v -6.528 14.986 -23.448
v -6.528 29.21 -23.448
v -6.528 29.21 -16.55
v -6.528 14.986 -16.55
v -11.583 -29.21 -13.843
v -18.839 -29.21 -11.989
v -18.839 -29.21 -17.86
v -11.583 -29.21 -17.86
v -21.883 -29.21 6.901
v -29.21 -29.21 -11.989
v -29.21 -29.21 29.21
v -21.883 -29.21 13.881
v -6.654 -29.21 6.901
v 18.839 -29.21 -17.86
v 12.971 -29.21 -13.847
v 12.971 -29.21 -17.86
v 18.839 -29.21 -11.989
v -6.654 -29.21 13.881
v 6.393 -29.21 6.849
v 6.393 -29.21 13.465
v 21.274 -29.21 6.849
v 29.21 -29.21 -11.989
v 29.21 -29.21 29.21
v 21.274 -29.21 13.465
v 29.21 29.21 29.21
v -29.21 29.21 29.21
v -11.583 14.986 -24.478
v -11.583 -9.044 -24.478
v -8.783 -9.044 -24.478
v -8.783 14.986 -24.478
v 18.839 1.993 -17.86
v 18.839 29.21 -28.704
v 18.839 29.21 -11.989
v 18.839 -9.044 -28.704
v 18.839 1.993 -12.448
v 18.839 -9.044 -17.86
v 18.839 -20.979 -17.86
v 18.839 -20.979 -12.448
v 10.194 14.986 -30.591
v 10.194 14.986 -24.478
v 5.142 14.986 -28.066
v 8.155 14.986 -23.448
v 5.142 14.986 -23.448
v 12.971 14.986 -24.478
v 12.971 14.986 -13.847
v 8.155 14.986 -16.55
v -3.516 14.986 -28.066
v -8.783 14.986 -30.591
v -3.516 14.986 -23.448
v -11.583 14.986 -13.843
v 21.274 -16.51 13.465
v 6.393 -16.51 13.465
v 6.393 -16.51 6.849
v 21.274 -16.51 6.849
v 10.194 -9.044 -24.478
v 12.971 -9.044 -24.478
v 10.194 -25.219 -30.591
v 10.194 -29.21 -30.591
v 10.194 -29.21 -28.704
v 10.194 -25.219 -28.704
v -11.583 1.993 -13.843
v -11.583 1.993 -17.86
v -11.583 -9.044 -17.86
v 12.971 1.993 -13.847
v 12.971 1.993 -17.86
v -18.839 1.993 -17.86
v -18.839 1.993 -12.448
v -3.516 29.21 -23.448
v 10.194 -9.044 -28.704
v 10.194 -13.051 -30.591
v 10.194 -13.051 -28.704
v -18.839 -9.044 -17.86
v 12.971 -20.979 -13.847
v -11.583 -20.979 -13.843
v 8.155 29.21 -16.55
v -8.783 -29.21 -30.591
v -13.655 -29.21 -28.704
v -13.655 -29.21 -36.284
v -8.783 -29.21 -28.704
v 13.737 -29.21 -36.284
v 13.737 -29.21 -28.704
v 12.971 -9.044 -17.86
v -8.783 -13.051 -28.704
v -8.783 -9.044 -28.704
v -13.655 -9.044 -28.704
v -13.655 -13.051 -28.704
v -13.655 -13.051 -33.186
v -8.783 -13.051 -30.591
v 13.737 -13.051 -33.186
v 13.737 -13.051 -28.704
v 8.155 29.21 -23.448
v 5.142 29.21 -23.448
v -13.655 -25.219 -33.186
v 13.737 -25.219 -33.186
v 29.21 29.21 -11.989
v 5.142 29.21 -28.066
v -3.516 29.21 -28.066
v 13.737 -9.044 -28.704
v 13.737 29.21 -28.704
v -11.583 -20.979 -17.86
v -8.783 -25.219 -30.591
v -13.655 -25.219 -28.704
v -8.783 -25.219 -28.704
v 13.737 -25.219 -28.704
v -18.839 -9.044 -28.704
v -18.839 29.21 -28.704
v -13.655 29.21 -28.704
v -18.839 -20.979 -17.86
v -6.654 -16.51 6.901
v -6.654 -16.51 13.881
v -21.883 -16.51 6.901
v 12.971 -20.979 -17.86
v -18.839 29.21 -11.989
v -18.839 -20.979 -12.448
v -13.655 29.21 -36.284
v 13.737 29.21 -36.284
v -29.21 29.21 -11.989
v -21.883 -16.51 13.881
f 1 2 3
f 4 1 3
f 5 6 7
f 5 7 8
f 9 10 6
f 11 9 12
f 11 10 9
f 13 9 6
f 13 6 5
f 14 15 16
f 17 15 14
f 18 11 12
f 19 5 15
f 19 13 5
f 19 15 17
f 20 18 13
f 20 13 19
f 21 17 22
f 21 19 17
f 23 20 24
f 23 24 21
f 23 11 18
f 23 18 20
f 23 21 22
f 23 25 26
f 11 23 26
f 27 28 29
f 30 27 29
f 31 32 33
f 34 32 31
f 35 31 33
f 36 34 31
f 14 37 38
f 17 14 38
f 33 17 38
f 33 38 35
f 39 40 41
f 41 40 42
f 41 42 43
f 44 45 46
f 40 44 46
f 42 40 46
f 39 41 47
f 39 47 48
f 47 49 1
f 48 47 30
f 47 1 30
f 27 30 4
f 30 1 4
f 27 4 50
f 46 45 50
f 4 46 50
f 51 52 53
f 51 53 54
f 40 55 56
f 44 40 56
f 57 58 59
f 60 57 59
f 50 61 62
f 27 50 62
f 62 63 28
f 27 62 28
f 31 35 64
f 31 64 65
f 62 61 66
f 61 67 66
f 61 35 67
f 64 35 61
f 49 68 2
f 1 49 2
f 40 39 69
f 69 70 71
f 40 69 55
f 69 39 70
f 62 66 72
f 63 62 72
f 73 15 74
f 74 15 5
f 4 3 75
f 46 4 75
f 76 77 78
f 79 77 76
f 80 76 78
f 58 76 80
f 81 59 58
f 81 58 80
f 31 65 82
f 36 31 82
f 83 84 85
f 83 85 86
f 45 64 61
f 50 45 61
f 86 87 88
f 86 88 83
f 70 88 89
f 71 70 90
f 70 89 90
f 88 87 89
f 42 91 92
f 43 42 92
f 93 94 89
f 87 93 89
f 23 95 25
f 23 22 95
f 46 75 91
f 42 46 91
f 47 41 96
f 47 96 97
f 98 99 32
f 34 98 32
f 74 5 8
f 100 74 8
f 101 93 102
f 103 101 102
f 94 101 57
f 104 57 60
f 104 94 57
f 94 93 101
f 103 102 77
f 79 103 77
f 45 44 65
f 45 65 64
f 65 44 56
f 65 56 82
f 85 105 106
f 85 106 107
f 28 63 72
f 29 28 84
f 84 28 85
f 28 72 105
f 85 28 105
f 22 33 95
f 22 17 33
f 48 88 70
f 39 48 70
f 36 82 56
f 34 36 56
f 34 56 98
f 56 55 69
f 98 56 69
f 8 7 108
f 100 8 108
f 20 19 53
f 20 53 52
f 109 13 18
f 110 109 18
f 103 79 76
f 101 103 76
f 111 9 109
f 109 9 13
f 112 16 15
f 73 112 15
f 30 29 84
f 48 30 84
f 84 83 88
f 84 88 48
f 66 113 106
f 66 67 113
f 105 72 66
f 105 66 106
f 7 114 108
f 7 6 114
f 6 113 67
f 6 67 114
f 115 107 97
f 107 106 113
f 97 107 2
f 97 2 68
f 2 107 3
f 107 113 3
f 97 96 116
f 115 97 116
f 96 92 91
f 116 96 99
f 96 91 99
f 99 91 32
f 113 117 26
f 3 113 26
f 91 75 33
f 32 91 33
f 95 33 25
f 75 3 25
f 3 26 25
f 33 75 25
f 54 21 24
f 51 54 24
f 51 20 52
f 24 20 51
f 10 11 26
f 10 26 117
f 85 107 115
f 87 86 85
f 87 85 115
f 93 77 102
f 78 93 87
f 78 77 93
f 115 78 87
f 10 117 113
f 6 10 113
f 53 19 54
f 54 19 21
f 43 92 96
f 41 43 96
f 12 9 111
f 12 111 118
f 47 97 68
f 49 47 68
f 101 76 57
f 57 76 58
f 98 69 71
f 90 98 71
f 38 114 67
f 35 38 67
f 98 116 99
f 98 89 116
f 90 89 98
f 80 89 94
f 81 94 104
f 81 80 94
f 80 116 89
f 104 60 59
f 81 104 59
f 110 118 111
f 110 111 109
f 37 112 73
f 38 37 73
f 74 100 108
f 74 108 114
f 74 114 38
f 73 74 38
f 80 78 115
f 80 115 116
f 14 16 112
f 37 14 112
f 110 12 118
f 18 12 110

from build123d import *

# Parameters (mm, degrees)
F1_DEPTH  = 29.21
F2_W      = 15.2287210607
F2_H      = 6.9798285036
F2_W_2    = 14.8809022204
F2_H_2    = 6.6161153238
F3_DEPTH  = 12.7
F5_DEPTH  = 58.42
F7_DEPTH  = 37.677641958
F8_W      = 12.1679750076
F8_H      = 4.4820662588
F9_DEPTH  = 27.3915433795
F11_DEPTH = 14.224
F13_DEPTH = 14.224


# Not quite as in the source:
# - a feature names something its author has since deleted; it is built from what else it names


with BuildPart() as f1:
    # F0 (on Front) → F1 (new body, symmetric)
    with BuildSketch(Plane.XZ):
        Polygon((29.21, 29.21), (-29.21, 29.21), (-29.21, -11.9885886088), (-18.838820979, -11.9885886088), (-18.838820979, -28.7043564022), (-13.6548336595, -28.7043564022), (-13.6548336595, -36.2838581204), (13.73670972, -36.2838581204), (13.73670972, -28.7043564022), (18.838820979, -28.7043564022), (18.838820979, -11.9885886088), (29.21, -11.9885886088), align=None)
    extrude(amount=F1_DEPTH, both=True)

    # F2 (on face) → F3 (cut)
    with BuildSketch(Plane.XZ.offset(29.21)):
        with Locations((-14.2686051116, 10.3913402672)):
            Rectangle(F2_W, F2_H)
        with Locations((13.8336278745, 10.1568780676)):
            Rectangle(F2_W_2, F2_H_2)
    extrude(amount=-F3_DEPTH, mode=Mode.SUBTRACT)

    # F4 (on face) → F5 (cut, through all)
    with BuildSketch(Plane.XZ.offset(29.21)):
        Polygon((-11.5834288299, -13.842545168), (-11.5834288299, -24.4784541428), (-8.7825786322, -24.4784541428), (-8.7825786322, -30.5909998715), (10.1944149937, -30.5909998715), (10.1944149937, -24.4784541428), (12.9711292684, -24.4784541428), (12.9711292684, -13.8473447557), align=None)
    extrude(amount=-F5_DEPTH, mode=Mode.SUBTRACT)

    # F6 (on face) → F7 (cut, through all)
    with BuildSketch(Plane(origin=(-18.838820979, 0, 0), x_dir=(0, -1, 0), z_dir=(-1, 0, 0))):
        Polygon((20.9785699844, -12.4480193481), (-1.9933339208, -12.4480193481), (-1.9933339208, -17.8599096835), (9.0442672372, -17.8599096835), (9.0442672372, -28.7043564022), (29.3133463711, -28.7043564022), (29.3133463711, -17.8599096835), (20.9785699844, -17.8599096835), align=None)
    extrude(amount=-F7_DEPTH, mode=Mode.SUBTRACT)

    # F8 (on face) → F9 (cut, through all)
    with BuildSketch(Plane.YZ.offset(13.73670972)):
        with Locations((-19.1350400816, -30.9453895316)):
            Rectangle(F8_W, F8_H)
    extrude(amount=-F9_DEPTH, mode=Mode.SUBTRACT)

    # F10 (on face) → F11 (join)
    with BuildSketch(Plane(origin=(0, 29.21, 0), x_dir=(-1, 0, 0), z_dir=(0, 1, 0))):
        Polygon((12.8193823621, -11.6105714807), (-15.3379710391, -11.6105714807), (-15.3379710391, -26.3032335788), (-12.9711292684, -26.3032335788), (-12.9795083776, -31.884662807), (10.1667114277, -31.884662807), (10.1667114277, -26.3032335788), (12.8193823621, -26.3032335788), align=None)
    extrude(amount=-F11_DEPTH)

    # F12 (on face) → F13 (cut, through all)
    with BuildSketch(Plane(origin=(0, 29.21, 0), x_dir=(-1, 0, 0), z_dir=(0, 1, 0))):
        Polygon((6.527592428, -23.4476383775), (6.527592428, -16.5502689779), (-8.1549943425, -16.5502689779), (-8.1549943425, -23.4476383775), (-5.1418524235, -23.4476383775), (-5.1418524235, -28.0656591058), (3.516294295, -28.0656591058), (3.516294295, -23.4476383775), align=None)
    extrude(amount=-F13_DEPTH, mode=Mode.SUBTRACT)


solid = f1.part
